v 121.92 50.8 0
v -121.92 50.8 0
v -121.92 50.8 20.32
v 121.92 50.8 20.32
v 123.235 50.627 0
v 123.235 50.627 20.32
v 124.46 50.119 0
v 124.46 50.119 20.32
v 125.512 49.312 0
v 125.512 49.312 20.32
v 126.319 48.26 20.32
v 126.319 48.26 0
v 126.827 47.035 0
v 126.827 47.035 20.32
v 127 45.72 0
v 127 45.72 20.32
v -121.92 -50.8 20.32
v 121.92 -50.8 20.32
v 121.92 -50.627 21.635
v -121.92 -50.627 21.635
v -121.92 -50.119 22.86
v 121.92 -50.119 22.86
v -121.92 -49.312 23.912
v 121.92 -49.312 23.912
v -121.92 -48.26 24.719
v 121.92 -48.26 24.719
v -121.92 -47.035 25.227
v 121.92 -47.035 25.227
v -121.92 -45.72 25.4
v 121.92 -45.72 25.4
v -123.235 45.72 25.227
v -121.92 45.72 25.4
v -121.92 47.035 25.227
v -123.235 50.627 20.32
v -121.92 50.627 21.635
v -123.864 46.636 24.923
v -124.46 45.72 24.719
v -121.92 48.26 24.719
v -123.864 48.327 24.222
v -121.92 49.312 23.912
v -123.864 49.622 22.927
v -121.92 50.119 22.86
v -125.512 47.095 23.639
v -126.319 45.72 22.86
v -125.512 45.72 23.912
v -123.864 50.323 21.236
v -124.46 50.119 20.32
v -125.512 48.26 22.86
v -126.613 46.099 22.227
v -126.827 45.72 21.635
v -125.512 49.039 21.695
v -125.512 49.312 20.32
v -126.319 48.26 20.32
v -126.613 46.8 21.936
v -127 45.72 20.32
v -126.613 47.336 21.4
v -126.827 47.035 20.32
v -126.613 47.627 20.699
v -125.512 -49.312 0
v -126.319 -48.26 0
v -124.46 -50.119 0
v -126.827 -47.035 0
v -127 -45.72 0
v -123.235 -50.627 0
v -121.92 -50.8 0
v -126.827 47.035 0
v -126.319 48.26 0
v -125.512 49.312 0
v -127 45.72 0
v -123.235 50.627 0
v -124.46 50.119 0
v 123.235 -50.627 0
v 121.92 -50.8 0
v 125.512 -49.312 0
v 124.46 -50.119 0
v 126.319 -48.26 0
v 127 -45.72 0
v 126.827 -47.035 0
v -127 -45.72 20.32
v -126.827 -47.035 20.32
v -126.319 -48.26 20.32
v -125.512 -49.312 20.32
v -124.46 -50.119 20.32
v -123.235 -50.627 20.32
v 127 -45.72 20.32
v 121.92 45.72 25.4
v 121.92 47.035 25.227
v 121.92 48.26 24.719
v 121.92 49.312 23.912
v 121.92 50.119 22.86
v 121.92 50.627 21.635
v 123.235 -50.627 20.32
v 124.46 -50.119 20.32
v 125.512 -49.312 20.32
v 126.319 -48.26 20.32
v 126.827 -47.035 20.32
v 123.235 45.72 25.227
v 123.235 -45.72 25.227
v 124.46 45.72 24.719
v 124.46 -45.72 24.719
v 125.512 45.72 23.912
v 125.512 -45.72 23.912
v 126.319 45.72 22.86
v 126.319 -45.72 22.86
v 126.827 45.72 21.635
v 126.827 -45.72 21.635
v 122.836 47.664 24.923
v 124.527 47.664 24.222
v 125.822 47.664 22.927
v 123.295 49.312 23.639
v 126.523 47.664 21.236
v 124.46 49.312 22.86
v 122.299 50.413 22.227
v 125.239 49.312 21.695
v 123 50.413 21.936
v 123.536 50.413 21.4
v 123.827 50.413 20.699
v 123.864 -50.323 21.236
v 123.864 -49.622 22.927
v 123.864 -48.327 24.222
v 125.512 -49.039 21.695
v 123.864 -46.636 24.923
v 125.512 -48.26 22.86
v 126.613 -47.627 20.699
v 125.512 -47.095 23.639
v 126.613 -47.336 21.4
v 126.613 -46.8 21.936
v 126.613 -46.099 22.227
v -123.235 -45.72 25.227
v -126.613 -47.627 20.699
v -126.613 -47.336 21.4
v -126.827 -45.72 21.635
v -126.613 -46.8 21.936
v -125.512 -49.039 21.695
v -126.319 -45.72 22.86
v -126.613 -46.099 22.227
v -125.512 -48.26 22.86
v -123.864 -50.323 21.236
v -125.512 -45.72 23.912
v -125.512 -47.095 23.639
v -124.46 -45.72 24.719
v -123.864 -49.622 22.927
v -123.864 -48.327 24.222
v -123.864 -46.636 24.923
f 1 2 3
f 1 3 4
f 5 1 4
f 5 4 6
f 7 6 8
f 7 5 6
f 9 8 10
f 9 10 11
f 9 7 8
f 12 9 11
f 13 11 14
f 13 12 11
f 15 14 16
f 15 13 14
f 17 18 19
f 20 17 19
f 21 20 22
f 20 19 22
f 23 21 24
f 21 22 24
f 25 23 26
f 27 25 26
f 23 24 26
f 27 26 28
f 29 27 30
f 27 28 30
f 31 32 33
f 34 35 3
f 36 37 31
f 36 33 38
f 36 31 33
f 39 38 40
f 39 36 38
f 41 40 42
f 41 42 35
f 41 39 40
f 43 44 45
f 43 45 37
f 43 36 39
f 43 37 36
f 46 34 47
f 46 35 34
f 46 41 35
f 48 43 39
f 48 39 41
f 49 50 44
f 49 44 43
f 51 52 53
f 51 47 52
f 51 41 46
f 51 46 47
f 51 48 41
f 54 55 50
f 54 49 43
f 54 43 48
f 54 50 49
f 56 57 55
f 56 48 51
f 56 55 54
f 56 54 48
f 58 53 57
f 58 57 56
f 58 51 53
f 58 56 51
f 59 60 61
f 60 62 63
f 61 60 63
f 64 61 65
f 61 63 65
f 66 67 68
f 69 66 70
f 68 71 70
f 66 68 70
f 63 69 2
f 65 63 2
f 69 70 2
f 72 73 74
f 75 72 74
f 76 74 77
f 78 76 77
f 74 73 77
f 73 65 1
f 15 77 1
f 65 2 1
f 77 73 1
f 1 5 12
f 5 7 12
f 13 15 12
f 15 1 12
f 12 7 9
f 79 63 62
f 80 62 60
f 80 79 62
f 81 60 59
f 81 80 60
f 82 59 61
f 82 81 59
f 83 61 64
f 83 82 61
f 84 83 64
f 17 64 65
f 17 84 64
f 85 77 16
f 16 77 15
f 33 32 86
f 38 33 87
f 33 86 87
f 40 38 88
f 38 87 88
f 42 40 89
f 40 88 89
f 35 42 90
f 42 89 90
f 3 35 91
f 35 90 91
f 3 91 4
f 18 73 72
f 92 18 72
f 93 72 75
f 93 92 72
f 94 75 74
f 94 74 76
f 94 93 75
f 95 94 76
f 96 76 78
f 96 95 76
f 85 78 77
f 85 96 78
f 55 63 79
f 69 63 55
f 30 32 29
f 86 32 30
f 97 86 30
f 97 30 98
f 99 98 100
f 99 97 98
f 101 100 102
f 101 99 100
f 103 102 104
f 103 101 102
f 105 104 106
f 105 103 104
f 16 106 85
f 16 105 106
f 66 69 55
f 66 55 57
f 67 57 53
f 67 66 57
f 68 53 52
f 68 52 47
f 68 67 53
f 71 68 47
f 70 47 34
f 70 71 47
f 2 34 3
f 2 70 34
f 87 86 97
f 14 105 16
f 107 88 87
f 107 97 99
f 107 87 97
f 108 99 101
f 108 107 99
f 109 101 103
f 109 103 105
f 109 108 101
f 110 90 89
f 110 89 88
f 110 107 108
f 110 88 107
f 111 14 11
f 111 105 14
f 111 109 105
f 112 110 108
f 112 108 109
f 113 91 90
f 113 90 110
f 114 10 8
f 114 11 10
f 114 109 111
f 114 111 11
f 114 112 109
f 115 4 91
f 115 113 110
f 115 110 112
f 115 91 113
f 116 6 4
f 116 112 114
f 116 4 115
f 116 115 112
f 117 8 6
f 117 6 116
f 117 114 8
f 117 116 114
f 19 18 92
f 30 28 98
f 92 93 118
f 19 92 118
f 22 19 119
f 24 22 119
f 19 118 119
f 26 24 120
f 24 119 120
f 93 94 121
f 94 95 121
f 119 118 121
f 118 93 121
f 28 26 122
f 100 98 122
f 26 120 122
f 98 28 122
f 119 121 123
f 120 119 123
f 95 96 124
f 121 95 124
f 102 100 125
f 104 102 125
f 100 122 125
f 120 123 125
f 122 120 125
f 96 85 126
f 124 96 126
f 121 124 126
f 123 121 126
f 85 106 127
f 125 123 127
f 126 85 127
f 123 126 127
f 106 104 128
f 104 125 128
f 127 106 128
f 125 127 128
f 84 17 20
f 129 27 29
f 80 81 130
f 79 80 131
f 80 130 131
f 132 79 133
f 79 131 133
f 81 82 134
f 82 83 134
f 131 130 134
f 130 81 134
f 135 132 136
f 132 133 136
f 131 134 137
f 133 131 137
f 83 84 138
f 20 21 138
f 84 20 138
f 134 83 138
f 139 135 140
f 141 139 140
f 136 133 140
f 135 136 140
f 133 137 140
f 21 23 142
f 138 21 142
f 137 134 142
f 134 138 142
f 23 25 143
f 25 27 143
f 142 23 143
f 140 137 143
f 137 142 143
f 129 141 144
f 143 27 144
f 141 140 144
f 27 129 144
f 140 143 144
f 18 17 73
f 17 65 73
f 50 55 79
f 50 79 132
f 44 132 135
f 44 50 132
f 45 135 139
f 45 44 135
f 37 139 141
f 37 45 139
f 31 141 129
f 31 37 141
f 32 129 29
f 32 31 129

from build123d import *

# Parameters (mm, degrees)
F0_W        = 254
F0_H        = 101.6
F1_DEPTH    = 25.4
F2_R        = 5.08
F3_R        = 5.08
F4_T1_DEPTH = 33.02
F4_S5_W     = 5.08
F4_S5_H     = 5.08
F4_T6_DEPTH = 5.08
F5_T1_DEPTH = 33.02
F5_S5_W     = 5.08
F5_S5_H     = 5.08
F5_T6_DEPTH = 5.08


# Not quite as in the source:
# - a fillet or chamfer that OpenCascade refuses, or shapes differently, is made with other operations: its cross-section is extruded or revolved along the edge and cut away or added


with BuildPart() as f1:
    # F0 (on Top) → F1 (new body)
    with BuildSketch(Plane.XY):
        Rectangle(F0_W, F0_H)
    extrude(amount=F1_DEPTH)

    # F2
    f2_edges = [f1.edges().sort_by_distance(p)[0] for p in [
        (0, -50.8, 25.4),
    ]]
    fillet(f2_edges, radius=F2_R)

    # F3
    f3_edges = [f1.edges().sort_by_distance(p)[0] for p in [
        (127, 2.54, 25.4),
        (0, 50.8, 25.4),
        (-127, 2.54, 25.4),
    ]]
    fillet(f3_edges, radius=F3_R)

    # F4: fillet of radius 5.08 on 1 edges, made by hand

    # F4_s2 → F4_t1 (cut)
    with BuildSketch(Plane.XY.offset(-12.7)):
        with BuildLine():
            ThreePointArc((121.92, 50.8), (125.5121024484, 49.3121024484), (127, 45.72))
            Line((127, 45.72), (127, 50.8))
            Line((127, 50.8), (121.92, 50.8))
        make_face()
    extrude(amount=F4_T1_DEPTH, mode=Mode.SUBTRACT)


with BuildPart() as f4_tool4:
    # F4_s5 → F4_t6 (new body)
    with BuildSketch(Plane.XZ.offset(-45.72)):
        with Locations((124.46, 22.86)):
            Rectangle(F4_S5_W, F4_S5_H)
    extrude(amount=-F4_T6_DEPTH)

    # F4_s7 → F4_t8 (revolve, cut)
    with BuildSketch(Plane(origin=(121.92, 45.72, 20.32), x_dir=(-0.7071067812, 0, -0.7071067812), z_dir=(0.7071067812, 0, -0.7071067812))):
        with BuildLine():
            ThreePointArc((0, -5.08), (5.08, 0), (0, 5.08))
            Line((0, 5.08), (0, -5.08))
        make_face()
    revolve(axis=Axis((121.92, 45.72, 20.32), (0, 1, 0)), mode=Mode.SUBTRACT)


with BuildPart() as f1_1:
    add(f1.part)

    # F4_t3: cut F4_tool4
    add(f4_tool4.part, mode=Mode.SUBTRACT)

    # F5: fillet of radius 5.08 on 1 edges, made by hand

    # F5_s2 → F5_t1 (cut)
    with BuildSketch(Plane.XY.offset(-12.7)):
        with BuildLine():
            ThreePointArc((-127, 45.72), (-125.5121024484, 49.3121024484), (-121.92, 50.8))
            Line((-121.92, 50.8), (-127, 50.8))
            Line((-127, 50.8), (-127, 45.72))
        make_face()
    extrude(amount=F5_T1_DEPTH, mode=Mode.SUBTRACT)


with BuildPart() as f5_tool4:
    # F5_s5 → F5_t6 (new body)
    with BuildSketch(Plane.YZ.offset(-121.92)):
        with Locations((48.26, 22.86)):
            Rectangle(F5_S5_W, F5_S5_H)
    extrude(amount=-F5_T6_DEPTH)

    # F5_s7 → F5_t8 (revolve, cut)
    with BuildSketch(Plane(origin=(-121.92, 45.72, 20.32), x_dir=(0, -0.7071067812, -0.7071067812), z_dir=(0, 0.7071067812, -0.7071067812))):
        with BuildLine():
            ThreePointArc((0, -5.08), (5.08, 0), (0, 5.08))
            Line((0, 5.08), (0, -5.08))
        make_face()
    revolve(axis=Axis((-121.92, 45.72, 20.32), (-1, 0, 0)), mode=Mode.SUBTRACT)


with BuildPart() as f1_2:
    add(f1_1.part)

    # F5_t3: cut F5_tool4
    add(f5_tool4.part, mode=Mode.SUBTRACT)


solid = f1_2.part
